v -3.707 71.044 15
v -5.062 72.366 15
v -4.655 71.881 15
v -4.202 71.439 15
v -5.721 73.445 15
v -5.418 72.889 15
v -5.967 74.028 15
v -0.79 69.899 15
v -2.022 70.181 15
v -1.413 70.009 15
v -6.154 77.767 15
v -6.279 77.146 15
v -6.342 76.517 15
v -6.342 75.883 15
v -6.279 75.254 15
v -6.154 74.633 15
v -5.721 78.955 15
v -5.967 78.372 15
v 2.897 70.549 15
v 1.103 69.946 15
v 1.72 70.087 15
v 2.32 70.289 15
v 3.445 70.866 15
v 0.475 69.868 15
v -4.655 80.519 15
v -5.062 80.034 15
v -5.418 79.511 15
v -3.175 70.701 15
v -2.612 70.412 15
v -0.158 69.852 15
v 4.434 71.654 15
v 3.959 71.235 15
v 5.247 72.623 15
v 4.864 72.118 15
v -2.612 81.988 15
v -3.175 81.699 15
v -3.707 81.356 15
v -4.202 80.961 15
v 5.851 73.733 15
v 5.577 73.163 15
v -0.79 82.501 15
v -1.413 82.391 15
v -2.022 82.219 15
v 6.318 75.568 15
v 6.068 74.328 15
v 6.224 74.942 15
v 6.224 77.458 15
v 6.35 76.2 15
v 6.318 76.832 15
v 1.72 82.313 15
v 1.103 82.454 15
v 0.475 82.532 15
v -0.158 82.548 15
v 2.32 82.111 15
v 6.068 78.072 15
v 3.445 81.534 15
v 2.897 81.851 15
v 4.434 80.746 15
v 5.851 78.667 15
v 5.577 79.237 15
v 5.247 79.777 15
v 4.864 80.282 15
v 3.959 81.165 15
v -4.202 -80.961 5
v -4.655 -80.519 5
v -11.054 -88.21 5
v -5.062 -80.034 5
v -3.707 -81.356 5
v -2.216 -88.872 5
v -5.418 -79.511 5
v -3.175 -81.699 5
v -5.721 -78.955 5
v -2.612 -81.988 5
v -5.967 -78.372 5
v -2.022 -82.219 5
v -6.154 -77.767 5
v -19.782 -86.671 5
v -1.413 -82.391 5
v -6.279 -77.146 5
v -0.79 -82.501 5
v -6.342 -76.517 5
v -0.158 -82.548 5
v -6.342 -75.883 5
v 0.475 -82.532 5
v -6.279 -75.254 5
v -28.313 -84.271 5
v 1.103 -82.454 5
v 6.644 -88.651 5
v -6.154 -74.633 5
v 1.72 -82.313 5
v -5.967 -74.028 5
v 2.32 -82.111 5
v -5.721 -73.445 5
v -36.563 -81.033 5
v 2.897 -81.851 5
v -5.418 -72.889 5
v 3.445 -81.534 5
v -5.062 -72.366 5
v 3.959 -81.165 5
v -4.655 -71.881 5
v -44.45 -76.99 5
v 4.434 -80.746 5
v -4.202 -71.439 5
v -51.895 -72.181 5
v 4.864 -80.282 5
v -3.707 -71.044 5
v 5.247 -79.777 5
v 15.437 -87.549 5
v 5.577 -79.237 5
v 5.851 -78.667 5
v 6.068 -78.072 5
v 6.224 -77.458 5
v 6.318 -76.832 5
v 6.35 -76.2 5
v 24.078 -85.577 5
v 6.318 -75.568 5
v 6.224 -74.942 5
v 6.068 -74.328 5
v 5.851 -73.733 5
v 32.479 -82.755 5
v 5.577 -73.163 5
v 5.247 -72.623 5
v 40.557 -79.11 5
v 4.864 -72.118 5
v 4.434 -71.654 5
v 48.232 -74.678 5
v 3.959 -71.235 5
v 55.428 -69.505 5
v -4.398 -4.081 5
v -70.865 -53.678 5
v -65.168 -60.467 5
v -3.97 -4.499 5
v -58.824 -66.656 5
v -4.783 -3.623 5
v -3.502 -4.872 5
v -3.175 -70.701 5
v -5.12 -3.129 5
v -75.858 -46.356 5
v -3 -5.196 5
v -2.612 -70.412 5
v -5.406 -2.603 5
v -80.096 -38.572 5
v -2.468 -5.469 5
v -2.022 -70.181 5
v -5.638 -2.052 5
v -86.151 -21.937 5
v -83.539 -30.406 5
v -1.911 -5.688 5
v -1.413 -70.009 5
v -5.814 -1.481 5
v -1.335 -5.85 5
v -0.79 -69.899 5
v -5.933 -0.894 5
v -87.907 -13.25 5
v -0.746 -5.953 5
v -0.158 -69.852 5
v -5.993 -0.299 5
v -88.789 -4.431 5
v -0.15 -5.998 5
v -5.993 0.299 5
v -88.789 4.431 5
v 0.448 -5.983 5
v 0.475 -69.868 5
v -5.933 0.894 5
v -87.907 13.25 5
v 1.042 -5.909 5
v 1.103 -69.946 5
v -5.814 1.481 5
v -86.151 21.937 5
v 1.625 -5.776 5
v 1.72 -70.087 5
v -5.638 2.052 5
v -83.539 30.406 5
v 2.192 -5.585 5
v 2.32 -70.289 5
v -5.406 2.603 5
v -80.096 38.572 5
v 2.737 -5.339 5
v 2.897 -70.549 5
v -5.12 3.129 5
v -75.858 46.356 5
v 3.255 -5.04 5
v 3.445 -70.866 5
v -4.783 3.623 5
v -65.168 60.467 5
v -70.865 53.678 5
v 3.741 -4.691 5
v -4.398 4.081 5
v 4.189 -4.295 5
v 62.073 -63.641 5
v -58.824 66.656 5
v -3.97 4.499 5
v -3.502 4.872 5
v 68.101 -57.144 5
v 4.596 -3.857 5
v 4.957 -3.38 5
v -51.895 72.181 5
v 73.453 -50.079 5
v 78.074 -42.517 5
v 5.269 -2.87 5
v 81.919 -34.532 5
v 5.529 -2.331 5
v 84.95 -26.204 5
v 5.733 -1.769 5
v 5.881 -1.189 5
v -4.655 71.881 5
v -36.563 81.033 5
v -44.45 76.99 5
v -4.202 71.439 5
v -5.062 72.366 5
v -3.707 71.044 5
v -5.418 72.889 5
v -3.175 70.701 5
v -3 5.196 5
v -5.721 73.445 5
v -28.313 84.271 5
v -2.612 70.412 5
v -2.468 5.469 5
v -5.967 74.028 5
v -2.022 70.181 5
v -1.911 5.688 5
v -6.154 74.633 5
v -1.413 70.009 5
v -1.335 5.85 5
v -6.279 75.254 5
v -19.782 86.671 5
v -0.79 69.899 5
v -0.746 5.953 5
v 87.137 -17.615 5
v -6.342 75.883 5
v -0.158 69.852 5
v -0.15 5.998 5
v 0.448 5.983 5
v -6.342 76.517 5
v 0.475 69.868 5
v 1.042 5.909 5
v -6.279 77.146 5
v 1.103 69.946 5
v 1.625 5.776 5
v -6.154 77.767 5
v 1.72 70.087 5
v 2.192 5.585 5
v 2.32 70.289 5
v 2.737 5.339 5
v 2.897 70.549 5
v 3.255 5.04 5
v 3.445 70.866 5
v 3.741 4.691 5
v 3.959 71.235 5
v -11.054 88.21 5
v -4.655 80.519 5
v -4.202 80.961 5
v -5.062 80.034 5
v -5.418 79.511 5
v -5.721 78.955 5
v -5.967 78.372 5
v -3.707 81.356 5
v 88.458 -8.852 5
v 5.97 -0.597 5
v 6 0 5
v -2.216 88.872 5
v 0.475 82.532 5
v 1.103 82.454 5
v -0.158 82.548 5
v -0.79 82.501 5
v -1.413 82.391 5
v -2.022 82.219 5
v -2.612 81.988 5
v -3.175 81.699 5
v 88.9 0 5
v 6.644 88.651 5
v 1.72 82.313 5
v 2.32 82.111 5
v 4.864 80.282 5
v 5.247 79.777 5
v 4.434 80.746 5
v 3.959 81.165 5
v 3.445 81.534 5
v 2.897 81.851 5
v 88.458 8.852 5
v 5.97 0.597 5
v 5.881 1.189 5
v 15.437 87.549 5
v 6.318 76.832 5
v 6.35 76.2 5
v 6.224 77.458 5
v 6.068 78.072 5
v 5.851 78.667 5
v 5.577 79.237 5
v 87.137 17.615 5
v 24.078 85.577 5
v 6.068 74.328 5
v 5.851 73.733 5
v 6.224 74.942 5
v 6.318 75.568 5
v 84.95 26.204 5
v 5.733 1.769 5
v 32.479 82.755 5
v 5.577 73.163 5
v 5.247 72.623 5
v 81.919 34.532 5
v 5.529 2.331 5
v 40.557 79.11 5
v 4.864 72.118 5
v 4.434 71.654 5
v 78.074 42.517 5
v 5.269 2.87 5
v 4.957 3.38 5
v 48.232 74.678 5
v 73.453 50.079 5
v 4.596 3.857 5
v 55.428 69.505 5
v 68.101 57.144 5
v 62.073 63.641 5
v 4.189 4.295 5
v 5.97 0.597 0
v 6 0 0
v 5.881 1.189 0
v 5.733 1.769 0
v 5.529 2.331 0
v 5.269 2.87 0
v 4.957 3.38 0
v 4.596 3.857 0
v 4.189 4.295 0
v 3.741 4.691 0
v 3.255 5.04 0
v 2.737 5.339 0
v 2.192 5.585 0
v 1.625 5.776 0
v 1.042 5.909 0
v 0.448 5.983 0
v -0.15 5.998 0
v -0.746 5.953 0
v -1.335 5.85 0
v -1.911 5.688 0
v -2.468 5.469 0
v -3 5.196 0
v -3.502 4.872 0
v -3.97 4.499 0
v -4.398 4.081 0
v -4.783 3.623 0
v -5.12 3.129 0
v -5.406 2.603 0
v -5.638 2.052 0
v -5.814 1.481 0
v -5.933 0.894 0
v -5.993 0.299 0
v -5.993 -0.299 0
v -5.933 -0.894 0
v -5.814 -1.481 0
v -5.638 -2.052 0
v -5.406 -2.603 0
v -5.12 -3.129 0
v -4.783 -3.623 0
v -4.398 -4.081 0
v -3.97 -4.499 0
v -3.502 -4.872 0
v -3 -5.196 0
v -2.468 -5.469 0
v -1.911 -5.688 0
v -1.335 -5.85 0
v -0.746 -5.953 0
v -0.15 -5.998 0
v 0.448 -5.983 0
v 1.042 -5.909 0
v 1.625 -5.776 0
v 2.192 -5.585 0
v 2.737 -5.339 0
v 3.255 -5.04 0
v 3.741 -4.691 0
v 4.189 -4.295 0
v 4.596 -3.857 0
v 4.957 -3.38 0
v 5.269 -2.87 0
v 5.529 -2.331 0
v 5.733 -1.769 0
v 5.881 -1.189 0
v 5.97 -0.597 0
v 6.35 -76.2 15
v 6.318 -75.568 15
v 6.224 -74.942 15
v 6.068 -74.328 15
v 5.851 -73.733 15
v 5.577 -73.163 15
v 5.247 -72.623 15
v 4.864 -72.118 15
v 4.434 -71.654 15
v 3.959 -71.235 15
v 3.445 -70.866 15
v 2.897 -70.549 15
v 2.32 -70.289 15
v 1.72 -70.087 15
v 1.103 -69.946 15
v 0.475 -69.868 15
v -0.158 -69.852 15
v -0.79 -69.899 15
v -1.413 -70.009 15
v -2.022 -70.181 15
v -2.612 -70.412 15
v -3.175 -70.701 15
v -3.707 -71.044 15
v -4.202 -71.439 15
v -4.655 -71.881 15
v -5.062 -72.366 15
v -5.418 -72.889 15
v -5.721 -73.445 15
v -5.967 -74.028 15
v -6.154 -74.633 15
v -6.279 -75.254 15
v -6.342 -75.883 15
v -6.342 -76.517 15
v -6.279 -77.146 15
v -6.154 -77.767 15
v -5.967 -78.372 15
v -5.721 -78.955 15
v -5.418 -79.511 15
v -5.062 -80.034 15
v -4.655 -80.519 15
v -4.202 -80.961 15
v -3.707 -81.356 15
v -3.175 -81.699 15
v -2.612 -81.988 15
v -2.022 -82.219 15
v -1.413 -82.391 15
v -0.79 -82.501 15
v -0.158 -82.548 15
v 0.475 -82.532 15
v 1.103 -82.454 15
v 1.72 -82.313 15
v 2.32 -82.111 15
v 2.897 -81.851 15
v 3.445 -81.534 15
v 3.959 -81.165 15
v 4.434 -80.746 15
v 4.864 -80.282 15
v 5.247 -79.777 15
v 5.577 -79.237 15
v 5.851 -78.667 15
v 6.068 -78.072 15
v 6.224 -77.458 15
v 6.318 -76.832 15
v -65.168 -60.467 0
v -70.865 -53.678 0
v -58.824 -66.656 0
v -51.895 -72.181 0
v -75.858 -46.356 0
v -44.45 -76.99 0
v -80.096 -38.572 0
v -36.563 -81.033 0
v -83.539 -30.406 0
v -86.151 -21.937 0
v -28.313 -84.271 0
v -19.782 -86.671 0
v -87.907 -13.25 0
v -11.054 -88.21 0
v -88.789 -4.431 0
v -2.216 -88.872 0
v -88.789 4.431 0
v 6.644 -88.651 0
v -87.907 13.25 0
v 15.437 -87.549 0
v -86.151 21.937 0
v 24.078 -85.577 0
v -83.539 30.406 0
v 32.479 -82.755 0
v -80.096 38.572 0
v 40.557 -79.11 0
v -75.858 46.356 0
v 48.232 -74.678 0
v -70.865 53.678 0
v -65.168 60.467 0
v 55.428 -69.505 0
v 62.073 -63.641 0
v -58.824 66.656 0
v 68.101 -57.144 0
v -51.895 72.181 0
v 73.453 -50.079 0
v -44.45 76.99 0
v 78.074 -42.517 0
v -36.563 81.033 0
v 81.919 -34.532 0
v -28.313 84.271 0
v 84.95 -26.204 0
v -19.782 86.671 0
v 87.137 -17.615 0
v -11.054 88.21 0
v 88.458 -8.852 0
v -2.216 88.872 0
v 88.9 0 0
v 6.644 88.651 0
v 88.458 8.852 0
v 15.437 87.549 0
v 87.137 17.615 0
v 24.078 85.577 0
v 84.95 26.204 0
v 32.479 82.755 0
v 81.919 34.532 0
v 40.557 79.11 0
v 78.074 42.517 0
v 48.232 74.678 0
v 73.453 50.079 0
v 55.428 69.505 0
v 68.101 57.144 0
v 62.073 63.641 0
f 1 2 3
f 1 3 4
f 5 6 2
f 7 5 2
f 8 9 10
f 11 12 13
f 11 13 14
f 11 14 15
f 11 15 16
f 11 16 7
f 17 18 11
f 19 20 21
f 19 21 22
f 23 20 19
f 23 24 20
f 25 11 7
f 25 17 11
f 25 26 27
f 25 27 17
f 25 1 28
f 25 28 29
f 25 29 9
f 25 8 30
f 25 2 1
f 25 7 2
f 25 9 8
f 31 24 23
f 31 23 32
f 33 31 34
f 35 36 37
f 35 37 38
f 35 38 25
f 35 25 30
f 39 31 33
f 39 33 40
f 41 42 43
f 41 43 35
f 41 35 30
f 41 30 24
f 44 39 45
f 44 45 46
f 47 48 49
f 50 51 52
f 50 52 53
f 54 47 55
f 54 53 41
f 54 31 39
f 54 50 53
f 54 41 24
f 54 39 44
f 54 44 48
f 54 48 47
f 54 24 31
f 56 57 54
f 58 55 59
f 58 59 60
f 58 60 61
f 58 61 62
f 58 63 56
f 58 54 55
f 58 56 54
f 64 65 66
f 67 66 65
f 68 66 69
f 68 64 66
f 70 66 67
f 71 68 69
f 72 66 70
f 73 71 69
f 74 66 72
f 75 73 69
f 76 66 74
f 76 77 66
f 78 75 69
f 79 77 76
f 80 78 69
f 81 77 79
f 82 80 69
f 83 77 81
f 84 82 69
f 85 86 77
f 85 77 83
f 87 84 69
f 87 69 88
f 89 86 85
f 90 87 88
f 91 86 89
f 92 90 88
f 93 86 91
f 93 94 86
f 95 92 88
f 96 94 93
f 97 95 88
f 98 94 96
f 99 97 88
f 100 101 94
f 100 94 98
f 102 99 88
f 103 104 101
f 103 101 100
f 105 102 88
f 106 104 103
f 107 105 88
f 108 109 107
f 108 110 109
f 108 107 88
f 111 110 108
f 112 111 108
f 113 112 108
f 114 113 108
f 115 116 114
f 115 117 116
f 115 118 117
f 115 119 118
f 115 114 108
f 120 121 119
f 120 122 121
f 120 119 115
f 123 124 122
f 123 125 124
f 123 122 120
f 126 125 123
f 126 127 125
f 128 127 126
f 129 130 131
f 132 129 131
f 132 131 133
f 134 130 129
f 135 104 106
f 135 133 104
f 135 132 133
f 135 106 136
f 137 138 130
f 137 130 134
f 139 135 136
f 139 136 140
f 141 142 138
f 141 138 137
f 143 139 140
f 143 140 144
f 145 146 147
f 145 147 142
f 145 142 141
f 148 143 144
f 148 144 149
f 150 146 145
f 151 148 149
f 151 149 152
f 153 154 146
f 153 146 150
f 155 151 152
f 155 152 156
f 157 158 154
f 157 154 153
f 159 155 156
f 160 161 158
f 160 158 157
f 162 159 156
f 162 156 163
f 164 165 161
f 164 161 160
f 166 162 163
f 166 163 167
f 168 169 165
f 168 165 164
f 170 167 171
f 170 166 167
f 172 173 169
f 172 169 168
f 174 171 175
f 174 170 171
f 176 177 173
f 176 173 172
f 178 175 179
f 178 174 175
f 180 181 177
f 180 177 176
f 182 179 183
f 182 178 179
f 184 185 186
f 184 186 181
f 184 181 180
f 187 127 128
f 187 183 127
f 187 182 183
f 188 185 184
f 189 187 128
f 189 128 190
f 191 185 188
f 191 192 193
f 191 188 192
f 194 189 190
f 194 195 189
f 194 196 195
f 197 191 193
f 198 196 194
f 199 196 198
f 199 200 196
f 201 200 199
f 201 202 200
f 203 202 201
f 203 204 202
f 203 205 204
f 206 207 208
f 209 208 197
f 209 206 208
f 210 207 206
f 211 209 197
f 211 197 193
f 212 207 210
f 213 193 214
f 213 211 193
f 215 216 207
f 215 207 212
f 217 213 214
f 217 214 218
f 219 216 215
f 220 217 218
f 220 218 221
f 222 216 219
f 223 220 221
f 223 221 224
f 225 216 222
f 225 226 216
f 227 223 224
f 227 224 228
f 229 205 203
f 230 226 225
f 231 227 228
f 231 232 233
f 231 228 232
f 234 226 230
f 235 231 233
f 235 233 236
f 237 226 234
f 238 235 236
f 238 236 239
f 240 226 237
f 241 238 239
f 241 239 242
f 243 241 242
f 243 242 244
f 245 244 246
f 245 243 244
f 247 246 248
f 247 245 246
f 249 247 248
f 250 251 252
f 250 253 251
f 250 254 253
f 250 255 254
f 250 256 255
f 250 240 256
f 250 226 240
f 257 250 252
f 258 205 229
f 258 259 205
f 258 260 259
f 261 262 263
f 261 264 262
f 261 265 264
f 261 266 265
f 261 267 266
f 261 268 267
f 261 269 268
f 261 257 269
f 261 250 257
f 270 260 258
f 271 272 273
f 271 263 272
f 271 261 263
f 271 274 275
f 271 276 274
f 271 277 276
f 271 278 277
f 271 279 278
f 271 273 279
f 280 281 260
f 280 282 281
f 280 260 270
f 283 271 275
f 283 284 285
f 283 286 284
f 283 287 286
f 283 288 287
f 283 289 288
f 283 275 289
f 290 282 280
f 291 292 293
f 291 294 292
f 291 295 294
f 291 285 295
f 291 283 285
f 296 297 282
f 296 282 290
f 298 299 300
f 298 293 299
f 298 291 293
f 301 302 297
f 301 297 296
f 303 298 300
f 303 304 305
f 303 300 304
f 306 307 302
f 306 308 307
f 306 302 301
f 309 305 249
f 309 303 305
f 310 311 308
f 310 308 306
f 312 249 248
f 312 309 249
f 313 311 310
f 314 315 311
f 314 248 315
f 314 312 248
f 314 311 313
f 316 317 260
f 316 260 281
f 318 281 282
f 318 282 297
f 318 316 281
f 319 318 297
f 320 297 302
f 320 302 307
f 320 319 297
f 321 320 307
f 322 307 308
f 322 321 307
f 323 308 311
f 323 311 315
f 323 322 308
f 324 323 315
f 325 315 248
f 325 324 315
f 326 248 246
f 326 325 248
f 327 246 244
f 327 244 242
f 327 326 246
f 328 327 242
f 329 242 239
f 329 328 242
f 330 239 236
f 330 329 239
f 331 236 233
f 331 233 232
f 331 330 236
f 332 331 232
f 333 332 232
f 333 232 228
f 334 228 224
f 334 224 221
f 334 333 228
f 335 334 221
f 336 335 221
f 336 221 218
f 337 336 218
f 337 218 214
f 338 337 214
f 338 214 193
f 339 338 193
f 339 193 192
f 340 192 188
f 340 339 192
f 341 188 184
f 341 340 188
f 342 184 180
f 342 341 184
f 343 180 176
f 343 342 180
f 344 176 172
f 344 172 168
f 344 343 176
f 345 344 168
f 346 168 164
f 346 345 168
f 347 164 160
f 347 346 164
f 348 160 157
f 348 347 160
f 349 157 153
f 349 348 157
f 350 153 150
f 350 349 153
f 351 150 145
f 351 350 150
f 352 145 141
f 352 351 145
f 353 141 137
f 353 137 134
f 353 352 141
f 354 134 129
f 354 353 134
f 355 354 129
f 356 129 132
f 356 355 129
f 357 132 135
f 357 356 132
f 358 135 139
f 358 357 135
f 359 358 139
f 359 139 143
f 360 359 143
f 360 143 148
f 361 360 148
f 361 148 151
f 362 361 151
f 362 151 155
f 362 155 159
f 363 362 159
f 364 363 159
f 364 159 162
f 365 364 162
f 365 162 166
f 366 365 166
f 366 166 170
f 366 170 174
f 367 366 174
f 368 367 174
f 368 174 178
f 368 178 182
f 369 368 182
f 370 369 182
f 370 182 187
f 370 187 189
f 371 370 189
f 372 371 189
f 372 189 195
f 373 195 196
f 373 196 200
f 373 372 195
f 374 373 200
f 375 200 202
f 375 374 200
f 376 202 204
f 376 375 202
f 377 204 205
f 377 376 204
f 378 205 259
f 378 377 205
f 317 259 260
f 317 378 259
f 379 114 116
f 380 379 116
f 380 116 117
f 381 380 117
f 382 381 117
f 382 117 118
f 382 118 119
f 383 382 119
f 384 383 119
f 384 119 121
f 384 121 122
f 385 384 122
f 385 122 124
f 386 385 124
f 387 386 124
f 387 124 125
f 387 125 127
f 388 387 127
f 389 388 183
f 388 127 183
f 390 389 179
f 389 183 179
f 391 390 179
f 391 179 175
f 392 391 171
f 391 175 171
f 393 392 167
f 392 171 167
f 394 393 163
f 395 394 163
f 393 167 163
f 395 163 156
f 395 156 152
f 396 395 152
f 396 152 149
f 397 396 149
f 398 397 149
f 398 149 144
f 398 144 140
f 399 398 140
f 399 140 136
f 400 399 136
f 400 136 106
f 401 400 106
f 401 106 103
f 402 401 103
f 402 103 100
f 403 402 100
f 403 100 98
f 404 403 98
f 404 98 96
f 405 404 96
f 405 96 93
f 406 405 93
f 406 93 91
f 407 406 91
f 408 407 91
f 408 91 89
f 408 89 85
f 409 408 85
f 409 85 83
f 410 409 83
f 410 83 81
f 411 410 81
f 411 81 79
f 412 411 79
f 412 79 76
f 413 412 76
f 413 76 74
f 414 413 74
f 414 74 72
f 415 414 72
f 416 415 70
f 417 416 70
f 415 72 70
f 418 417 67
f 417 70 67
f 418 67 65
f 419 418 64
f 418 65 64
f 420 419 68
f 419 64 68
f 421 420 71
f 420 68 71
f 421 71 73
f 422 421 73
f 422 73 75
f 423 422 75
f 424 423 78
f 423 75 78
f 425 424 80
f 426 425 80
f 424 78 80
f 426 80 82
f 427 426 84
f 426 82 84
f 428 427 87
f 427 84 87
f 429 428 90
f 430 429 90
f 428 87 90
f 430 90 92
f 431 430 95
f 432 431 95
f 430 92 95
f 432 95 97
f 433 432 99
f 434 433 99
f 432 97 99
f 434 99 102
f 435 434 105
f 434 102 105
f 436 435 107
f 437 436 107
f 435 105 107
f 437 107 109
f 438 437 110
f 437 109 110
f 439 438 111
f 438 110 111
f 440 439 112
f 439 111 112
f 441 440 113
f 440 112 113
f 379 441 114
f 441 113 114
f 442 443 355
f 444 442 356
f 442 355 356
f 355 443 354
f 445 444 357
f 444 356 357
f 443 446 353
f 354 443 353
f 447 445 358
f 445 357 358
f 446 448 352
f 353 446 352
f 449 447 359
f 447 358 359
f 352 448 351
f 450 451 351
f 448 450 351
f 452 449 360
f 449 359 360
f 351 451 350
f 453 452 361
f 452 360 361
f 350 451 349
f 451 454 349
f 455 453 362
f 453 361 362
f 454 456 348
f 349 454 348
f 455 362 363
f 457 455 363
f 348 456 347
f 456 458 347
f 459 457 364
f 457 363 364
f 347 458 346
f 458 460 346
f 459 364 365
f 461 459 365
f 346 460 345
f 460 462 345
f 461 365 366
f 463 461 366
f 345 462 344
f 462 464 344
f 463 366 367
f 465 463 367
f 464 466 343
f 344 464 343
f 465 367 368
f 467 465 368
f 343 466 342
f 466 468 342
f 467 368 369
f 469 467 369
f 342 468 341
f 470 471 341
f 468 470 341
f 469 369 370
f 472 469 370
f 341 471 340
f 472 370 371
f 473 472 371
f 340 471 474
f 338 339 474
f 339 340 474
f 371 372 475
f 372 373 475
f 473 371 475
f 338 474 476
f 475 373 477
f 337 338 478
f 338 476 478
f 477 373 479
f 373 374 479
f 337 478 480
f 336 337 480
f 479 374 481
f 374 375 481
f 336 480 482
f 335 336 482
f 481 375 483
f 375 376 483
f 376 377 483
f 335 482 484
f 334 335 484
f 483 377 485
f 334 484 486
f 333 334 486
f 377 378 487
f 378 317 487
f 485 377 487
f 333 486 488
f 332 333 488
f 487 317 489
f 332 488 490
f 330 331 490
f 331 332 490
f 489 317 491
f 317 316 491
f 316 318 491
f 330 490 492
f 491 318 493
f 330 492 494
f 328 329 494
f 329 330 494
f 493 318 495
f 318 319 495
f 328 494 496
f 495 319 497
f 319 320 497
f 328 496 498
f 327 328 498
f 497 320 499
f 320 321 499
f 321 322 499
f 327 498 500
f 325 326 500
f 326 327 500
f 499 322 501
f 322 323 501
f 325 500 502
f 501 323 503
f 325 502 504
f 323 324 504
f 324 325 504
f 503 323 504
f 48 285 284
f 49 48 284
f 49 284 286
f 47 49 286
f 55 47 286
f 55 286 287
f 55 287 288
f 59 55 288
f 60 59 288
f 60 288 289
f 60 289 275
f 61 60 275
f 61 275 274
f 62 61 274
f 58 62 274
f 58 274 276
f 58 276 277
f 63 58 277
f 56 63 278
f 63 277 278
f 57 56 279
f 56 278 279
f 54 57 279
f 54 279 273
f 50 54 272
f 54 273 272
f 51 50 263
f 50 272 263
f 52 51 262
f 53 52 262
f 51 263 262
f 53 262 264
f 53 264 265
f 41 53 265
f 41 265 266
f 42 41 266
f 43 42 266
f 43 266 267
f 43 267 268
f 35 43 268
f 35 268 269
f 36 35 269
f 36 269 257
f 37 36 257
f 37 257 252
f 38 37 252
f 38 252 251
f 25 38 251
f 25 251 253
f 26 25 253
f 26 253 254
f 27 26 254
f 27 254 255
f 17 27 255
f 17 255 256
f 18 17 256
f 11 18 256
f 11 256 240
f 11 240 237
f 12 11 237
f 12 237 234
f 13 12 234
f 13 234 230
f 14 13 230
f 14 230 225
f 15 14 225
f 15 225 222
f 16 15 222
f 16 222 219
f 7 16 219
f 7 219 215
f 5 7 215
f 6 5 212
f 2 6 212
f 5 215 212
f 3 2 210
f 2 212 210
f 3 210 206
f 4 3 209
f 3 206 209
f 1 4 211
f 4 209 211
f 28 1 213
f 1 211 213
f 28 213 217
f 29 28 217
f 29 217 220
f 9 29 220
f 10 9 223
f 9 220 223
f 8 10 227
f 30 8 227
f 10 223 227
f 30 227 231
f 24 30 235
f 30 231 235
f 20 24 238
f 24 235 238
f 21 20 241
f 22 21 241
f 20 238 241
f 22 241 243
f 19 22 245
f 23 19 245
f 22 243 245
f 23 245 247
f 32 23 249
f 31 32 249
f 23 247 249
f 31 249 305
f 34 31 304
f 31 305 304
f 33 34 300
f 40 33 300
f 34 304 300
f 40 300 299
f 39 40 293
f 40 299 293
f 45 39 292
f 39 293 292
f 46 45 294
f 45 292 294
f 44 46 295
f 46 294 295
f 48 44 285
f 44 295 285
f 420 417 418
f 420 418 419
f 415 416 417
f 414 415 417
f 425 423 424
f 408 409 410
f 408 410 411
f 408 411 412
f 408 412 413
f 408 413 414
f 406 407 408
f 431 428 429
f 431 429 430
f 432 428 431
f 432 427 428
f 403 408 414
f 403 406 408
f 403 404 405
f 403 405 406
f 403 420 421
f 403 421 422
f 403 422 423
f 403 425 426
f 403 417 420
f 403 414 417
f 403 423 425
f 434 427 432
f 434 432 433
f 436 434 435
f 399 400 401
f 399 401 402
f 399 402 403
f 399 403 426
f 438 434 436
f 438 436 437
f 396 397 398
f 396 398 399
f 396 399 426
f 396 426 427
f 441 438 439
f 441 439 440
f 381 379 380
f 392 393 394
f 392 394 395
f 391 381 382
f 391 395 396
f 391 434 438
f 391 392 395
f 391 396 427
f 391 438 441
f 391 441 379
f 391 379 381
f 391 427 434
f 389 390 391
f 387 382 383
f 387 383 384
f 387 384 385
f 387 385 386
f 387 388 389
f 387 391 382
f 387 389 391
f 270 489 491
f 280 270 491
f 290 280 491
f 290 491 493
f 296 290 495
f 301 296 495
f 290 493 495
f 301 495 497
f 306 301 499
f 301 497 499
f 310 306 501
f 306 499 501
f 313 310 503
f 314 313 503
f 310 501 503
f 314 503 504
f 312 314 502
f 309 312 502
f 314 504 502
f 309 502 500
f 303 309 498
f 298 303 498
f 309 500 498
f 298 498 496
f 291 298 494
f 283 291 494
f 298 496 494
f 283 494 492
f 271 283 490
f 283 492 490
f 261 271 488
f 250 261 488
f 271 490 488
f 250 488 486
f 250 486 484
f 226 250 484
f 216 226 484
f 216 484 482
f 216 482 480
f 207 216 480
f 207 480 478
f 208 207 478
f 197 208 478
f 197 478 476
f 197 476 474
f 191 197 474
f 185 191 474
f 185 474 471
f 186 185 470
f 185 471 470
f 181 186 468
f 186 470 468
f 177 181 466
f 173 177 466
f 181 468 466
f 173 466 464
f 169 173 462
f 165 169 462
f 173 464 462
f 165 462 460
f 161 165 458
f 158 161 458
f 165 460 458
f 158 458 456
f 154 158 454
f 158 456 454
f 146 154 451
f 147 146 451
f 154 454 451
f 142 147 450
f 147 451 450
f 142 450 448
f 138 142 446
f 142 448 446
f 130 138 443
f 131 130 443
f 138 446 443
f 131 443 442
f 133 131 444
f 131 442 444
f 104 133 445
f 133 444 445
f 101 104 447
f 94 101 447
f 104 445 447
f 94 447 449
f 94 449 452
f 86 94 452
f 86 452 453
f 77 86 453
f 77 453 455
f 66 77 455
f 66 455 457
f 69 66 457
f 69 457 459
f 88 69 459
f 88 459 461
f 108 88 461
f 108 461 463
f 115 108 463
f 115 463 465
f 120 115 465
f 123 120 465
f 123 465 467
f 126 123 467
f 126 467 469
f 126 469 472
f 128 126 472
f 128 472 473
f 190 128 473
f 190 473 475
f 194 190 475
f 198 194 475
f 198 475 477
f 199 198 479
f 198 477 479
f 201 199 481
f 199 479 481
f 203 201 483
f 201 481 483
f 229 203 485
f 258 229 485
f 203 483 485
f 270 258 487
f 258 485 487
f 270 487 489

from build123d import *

# Parameters (mm, degrees)
SKETCH1_R           = 88.9
SKETCH1_R_2         = 6
SKETCH1_R_3         = 6.35
BOSS_EXTRUDE1_DEPTH = 5
SKETCH2_R           = 6.35
BOSS_EXTRUDE2_DEPTH = 15


with BuildPart() as part:
    # Sketch1 → Boss-Extrude1 (new body)
    with BuildSketch(Plane.XY):
        Circle(SKETCH1_R)
        Circle(SKETCH1_R_2, mode=Mode.SUBTRACT)
        with Locations((0, -76.2)):
            Circle(SKETCH1_R_3, mode=Mode.SUBTRACT)
        with Locations((0, 76.2)):
            Circle(SKETCH1_R_3, mode=Mode.SUBTRACT)
    extrude(amount=BOSS_EXTRUDE1_DEPTH)

    # Sketch2 → Boss-Extrude2 (add)
    with BuildSketch(Plane.XY):
        with Locations((0, -76.2)):
            Circle(SKETCH2_R)
        with Locations((0, 76.2)):
            Circle(SKETCH2_R)
    extrude(amount=BOSS_EXTRUDE2_DEPTH)


solid = part.part
